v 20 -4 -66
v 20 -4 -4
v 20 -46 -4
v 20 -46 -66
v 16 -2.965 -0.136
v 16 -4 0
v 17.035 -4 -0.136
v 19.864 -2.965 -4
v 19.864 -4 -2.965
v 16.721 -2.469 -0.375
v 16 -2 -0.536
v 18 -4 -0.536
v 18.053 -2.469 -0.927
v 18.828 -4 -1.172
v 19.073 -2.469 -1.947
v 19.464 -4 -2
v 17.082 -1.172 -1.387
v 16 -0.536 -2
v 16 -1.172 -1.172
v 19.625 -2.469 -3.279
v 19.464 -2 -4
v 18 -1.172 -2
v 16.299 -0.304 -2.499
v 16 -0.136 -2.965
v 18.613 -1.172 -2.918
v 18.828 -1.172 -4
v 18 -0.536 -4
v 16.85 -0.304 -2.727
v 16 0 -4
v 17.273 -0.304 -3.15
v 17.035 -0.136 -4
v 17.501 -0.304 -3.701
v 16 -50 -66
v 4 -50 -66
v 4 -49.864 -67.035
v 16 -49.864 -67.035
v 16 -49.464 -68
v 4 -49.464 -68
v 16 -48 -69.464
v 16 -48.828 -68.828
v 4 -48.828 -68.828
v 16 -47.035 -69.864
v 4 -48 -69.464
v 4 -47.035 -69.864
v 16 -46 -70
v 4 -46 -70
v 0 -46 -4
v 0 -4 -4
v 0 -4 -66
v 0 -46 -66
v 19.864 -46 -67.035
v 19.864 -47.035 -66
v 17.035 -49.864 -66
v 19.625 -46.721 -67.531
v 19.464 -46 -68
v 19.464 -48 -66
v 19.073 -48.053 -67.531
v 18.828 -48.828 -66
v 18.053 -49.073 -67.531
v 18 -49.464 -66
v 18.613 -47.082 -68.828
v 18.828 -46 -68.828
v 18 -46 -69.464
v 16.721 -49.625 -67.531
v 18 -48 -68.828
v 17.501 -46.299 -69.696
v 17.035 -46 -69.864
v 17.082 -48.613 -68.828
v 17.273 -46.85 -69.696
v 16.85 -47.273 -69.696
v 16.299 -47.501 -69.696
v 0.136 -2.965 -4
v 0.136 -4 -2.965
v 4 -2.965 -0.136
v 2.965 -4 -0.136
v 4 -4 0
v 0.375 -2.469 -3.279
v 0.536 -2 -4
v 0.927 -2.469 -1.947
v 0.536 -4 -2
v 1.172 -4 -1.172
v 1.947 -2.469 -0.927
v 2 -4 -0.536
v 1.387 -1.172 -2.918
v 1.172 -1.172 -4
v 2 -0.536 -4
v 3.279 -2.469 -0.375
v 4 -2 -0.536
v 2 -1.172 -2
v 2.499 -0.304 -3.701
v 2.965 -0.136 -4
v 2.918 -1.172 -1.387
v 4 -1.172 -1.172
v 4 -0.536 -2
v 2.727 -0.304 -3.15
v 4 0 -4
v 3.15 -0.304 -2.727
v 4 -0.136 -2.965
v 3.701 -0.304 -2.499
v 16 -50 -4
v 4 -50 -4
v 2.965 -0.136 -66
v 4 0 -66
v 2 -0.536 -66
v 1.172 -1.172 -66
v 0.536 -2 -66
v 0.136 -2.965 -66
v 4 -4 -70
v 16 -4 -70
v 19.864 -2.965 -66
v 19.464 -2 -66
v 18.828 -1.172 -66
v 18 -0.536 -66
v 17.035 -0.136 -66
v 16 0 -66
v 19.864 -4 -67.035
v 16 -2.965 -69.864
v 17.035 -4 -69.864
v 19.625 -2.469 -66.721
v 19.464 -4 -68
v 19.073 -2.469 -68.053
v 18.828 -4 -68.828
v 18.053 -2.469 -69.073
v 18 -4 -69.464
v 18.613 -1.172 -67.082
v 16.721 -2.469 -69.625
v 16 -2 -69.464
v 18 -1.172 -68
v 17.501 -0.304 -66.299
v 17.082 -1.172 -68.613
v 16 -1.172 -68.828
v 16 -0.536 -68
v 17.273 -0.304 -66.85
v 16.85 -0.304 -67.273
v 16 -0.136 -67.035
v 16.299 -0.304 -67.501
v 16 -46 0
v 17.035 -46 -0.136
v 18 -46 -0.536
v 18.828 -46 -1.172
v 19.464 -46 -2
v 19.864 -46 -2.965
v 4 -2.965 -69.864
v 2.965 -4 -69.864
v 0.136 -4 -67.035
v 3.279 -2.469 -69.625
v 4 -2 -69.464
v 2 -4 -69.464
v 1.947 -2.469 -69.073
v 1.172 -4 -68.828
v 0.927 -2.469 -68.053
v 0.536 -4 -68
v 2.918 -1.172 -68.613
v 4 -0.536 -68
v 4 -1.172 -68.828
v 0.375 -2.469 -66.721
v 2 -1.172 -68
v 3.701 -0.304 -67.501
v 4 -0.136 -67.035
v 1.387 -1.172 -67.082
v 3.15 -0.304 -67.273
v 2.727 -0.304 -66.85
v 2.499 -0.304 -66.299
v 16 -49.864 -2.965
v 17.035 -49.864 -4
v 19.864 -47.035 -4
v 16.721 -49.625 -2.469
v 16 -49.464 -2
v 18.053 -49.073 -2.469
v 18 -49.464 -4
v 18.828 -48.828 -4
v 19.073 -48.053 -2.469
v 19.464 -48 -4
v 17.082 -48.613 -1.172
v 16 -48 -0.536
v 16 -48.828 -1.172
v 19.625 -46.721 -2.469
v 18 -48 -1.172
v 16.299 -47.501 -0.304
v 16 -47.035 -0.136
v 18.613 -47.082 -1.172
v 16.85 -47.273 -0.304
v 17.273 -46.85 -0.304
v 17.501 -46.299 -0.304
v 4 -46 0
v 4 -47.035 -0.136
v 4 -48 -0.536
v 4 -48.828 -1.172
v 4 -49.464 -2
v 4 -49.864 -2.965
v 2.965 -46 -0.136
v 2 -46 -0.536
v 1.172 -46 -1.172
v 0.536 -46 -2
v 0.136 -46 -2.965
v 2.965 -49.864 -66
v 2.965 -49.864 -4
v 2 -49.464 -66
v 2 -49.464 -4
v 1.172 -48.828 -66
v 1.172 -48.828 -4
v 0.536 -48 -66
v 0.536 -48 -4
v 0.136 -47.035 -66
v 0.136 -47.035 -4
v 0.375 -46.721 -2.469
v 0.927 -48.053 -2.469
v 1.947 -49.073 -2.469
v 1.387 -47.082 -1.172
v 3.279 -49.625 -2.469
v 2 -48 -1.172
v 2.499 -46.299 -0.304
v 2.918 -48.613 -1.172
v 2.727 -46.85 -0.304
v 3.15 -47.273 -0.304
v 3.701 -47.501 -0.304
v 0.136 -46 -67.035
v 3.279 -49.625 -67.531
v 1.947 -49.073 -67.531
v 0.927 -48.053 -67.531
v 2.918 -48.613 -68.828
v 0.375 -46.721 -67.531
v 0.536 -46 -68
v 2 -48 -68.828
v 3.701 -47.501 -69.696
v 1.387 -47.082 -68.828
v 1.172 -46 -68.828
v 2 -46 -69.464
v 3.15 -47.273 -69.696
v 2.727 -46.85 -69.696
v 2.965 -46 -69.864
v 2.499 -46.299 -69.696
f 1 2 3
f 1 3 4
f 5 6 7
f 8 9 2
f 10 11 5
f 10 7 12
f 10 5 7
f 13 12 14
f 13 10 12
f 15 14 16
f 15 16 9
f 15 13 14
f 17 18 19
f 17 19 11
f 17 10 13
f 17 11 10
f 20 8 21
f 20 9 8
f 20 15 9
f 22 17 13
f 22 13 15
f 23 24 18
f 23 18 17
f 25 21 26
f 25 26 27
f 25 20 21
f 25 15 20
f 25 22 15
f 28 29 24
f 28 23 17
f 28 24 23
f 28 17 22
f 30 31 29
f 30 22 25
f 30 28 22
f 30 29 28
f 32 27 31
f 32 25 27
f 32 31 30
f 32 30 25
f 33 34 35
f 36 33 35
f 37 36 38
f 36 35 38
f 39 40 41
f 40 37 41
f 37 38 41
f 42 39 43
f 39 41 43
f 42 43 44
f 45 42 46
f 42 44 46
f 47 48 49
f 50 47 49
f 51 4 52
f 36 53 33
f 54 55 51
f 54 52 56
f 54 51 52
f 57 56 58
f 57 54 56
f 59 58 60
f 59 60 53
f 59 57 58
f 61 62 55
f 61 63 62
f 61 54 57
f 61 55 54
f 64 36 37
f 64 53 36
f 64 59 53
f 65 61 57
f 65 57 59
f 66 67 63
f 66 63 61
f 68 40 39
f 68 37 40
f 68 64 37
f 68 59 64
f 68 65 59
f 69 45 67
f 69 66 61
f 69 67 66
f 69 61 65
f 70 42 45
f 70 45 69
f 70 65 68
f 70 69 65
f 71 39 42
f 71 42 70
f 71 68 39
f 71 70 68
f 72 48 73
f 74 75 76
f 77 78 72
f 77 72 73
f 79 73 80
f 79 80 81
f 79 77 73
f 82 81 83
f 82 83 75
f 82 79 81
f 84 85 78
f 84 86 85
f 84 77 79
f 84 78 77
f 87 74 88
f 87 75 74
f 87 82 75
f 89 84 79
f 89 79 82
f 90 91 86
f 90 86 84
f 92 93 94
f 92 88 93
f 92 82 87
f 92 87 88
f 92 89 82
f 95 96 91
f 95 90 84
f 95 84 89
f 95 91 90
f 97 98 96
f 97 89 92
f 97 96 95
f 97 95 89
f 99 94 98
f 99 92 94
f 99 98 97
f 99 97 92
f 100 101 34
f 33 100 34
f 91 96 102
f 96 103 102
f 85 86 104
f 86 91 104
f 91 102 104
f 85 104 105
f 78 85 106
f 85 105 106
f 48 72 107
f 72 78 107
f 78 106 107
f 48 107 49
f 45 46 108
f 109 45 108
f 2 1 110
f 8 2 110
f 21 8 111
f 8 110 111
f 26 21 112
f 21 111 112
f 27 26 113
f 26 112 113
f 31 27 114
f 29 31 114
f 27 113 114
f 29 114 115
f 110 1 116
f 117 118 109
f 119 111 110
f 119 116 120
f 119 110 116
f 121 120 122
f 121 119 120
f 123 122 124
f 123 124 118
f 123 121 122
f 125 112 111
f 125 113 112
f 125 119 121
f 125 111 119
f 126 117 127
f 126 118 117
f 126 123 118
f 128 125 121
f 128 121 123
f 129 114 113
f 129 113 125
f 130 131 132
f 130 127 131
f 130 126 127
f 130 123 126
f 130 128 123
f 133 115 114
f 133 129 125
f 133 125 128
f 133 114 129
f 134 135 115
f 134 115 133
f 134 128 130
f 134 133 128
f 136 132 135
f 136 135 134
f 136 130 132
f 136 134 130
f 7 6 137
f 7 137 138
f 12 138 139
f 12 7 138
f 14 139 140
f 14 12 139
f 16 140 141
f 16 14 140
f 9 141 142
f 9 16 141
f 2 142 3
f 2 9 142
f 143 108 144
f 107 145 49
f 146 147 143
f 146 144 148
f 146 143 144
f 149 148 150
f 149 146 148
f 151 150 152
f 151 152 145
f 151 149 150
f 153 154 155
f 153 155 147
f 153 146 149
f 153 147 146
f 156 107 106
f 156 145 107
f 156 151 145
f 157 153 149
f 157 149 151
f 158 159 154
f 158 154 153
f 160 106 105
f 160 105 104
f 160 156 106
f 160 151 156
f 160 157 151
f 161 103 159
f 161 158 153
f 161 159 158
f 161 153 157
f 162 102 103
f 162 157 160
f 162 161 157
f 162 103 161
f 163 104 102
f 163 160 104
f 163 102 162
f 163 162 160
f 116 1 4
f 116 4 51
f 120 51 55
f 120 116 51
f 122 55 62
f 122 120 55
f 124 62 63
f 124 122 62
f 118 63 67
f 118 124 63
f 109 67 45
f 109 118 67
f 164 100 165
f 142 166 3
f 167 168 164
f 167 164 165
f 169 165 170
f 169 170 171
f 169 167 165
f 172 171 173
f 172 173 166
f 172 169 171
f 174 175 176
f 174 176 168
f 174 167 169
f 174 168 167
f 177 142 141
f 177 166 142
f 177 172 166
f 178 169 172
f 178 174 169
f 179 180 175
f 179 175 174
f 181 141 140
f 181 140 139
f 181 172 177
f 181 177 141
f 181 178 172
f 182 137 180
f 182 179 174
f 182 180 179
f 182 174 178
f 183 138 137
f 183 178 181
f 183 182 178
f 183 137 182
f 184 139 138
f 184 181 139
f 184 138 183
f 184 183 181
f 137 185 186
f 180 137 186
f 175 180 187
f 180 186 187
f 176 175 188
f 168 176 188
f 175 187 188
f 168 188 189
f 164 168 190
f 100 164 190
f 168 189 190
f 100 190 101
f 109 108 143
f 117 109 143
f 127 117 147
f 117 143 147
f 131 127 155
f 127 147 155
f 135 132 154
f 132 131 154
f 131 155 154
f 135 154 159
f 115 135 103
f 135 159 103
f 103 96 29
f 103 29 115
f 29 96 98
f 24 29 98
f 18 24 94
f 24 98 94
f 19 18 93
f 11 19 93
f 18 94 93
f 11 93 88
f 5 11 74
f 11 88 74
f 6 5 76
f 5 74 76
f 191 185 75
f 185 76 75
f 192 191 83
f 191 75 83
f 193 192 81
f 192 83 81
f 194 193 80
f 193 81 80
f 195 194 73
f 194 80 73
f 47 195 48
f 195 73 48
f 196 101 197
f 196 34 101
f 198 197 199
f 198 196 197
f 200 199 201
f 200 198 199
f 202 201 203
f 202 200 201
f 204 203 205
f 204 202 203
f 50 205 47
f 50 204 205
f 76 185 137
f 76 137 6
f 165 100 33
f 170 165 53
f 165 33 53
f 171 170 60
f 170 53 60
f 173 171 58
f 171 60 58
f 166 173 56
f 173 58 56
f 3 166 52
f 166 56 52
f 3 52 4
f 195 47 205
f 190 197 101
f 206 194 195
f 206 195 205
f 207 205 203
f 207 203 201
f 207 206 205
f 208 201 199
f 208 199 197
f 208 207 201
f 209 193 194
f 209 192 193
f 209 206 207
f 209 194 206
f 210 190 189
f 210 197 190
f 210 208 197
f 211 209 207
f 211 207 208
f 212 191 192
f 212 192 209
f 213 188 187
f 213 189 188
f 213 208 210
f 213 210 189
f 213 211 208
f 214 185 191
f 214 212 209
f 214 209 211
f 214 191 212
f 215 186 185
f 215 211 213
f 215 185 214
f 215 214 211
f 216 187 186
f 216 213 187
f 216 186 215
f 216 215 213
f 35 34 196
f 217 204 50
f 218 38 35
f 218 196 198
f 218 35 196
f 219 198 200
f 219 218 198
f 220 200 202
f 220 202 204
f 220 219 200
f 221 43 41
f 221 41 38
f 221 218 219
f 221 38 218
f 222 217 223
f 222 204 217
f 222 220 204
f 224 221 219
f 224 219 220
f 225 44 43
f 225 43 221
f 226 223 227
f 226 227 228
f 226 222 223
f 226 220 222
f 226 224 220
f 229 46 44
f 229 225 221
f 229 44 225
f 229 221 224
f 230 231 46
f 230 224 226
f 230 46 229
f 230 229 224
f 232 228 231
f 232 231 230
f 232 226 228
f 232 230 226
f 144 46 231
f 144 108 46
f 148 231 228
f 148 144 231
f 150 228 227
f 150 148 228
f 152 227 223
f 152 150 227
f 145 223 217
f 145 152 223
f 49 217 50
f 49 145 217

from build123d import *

# Parameters (mm, degrees)
SKETCH_1_W      = 70
SKETCH_1_H      = 50
EXTRUDE_1_DEPTH = 20
FILLET_1_R      = 4
FILLET_2_R      = 4
FILLET_3_R      = 4


with BuildPart() as part:
    # 草图1 → 凸台-拉伸1 (new body)
    with BuildSketch(Plane(origin=(0, 0, 0), x_dir=(0, 0, -1), z_dir=(1, 0, 0))):
        with Locations((35, -25)):
            Rectangle(SKETCH_1_W, SKETCH_1_H)
    extrude(amount=EXTRUDE_1_DEPTH)

    # 圆角1
    fillet_1_edges = [part.edges().sort_by_distance(p)[0] for p in [
        (0, 0, -35),
        (0, -25, -70),
        (0, -50, -35),
        (0, -25, 0),
    ]]
    fillet(fillet_1_edges, radius=FILLET_1_R)

    # 圆角2
    fillet_2_edges = [part.edges().sort_by_distance(p)[0] for p in [
        (20, -25, -70),
        (20, 0, -35),
        (20, -25, 0),
        (20, -50, -35),
    ]]
    fillet(fillet_2_edges, radius=FILLET_2_R)

    # 圆角3
    # the kernel refuses this fillet: 4 mm, written as the material it takes off along each edge
    with BuildSketch(Plane(origin=(4, -46, -4), x_dir=(0, -1, 0), z_dir=(0, 0, 1))) as fillet_3_piece_1_section:
        Polygon((0, 0), (FILLET_3_R, 0), (FILLET_3_R, -FILLET_3_R), (0, -FILLET_3_R), align=None)
    fillet_3_piece_1 = extrude(amount=FILLET_3_R, mode=Mode.PRIVATE)
    fillet_3_piece_1 = fillet_3_piece_1 - Plane(origin=(4, -46, -4), x_dir=(0.7071067811865475, 0.7071067811865475, 0), z_dir=(0, 0, 1)) * Sphere(FILLET_3_R, mode=Mode.PRIVATE)
    add(fillet_3_piece_1, mode=Mode.SUBTRACT)
    with BuildSketch(Plane(origin=(4, -4, -4), x_dir=(0, 0, 1), z_dir=(0, 1, 0))) as fillet_3_piece_2_section:
        Polygon((0, 0), (FILLET_3_R, 0), (FILLET_3_R, -FILLET_3_R), (0, -FILLET_3_R), align=None)
    fillet_3_piece_2 = extrude(amount=FILLET_3_R, mode=Mode.PRIVATE)
    fillet_3_piece_2 = fillet_3_piece_2 - Plane(origin=(4, -4, -4), x_dir=(0.7071067811865475, 0, -0.7071067811865475), z_dir=(0, 1, 0)) * Sphere(FILLET_3_R, mode=Mode.PRIVATE)
    add(fillet_3_piece_2, mode=Mode.SUBTRACT)
    with BuildSketch(Plane(origin=(4, -46, -66), x_dir=(0, -1, 0), z_dir=(0, 0, -1))) as fillet_3_piece_3_section:
        Polygon((0, 0), (FILLET_3_R, 0), (FILLET_3_R, FILLET_3_R), (0, FILLET_3_R), align=None)
    fillet_3_piece_3 = extrude(amount=FILLET_3_R, mode=Mode.PRIVATE)
    fillet_3_piece_3 = fillet_3_piece_3 - Plane(origin=(4, -46, -66), x_dir=(0.7071067811865475, 0.7071067811865475, 0), z_dir=(0, 0, -1)) * Sphere(FILLET_3_R, mode=Mode.PRIVATE)
    add(fillet_3_piece_3, mode=Mode.SUBTRACT)
    with BuildSketch(Plane(origin=(4, -4, -66), x_dir=(0, 0, -1), z_dir=(0, 1, 0))) as fillet_3_piece_4_section:
        Polygon((0, 0), (FILLET_3_R, 0), (FILLET_3_R, FILLET_3_R), (0, FILLET_3_R), align=None)
    fillet_3_piece_4 = extrude(amount=FILLET_3_R, mode=Mode.PRIVATE)
    fillet_3_piece_4 = fillet_3_piece_4 - Plane(origin=(4, -4, -66), x_dir=(0.7071067811865475, 0, 0.7071067811865475), z_dir=(0, 1, 0)) * Sphere(FILLET_3_R, mode=Mode.PRIVATE)
    add(fillet_3_piece_4, mode=Mode.SUBTRACT)
    with BuildSketch(Plane(origin=(16, -4, -66), x_dir=(0, 0, -1), z_dir=(0, 1, 0))) as fillet_3_piece_5_section:
        Polygon((0, 0), (FILLET_3_R, 0), (FILLET_3_R, -FILLET_3_R), (0, -FILLET_3_R), align=None)
    fillet_3_piece_5 = extrude(amount=FILLET_3_R, mode=Mode.PRIVATE)
    fillet_3_piece_5 = fillet_3_piece_5 - Plane(origin=(16, -4, -66), x_dir=(-0.7071067811865475, 0, 0.7071067811865475), z_dir=(0, 1, 0)) * Sphere(FILLET_3_R, mode=Mode.PRIVATE)
    add(fillet_3_piece_5, mode=Mode.SUBTRACT)
    with BuildSketch(Plane(origin=(16, -46, -66), x_dir=(0, -1, 0), z_dir=(0, 0, -1))) as fillet_3_piece_6_section:
        Polygon((0, 0), (FILLET_3_R, 0), (FILLET_3_R, -FILLET_3_R), (0, -FILLET_3_R), align=None)
    fillet_3_piece_6 = extrude(amount=FILLET_3_R, mode=Mode.PRIVATE)
    fillet_3_piece_6 = fillet_3_piece_6 - Plane(origin=(16, -46, -66), x_dir=(-0.7071067811865475, 0.7071067811865475, 0), z_dir=(0, 0, -1)) * Sphere(FILLET_3_R, mode=Mode.PRIVATE)
    add(fillet_3_piece_6, mode=Mode.SUBTRACT)
    with BuildSketch(Plane(origin=(16, -4, -4), x_dir=(0, 0, 1), z_dir=(0, 1, 0))) as fillet_3_piece_7_section:
        Polygon((0, 0), (FILLET_3_R, 0), (FILLET_3_R, FILLET_3_R), (0, FILLET_3_R), align=None)
    fillet_3_piece_7 = extrude(amount=FILLET_3_R, mode=Mode.PRIVATE)
    fillet_3_piece_7 = fillet_3_piece_7 - Plane(origin=(16, -4, -4), x_dir=(-0.7071067811865475, 0, -0.7071067811865475), z_dir=(0, 1, 0)) * Sphere(FILLET_3_R, mode=Mode.PRIVATE)
    add(fillet_3_piece_7, mode=Mode.SUBTRACT)
    with BuildSketch(Plane(origin=(16, -46, -4), x_dir=(0, -1, 0), z_dir=(0, 0, 1))) as fillet_3_piece_8_section:
        Polygon((0, 0), (FILLET_3_R, 0), (FILLET_3_R, FILLET_3_R), (0, FILLET_3_R), align=None)
    fillet_3_piece_8 = extrude(amount=FILLET_3_R, mode=Mode.PRIVATE)
    fillet_3_piece_8 = fillet_3_piece_8 - Plane(origin=(16, -46, -4), x_dir=(-0.7071067811865475, 0.7071067811865475, 0), z_dir=(0, 0, 1)) * Sphere(FILLET_3_R, mode=Mode.PRIVATE)
    add(fillet_3_piece_8, mode=Mode.SUBTRACT)
    with BuildSketch(Plane(origin=(4, 0, 0), x_dir=(0, 0, -1), z_dir=(1, 0, 0)), Plane(origin=(4, -50, 0), x_dir=(0, 1, 0), z_dir=(1, 0, 0))) as fillet_3_piece_9:
        with BuildLine():
            CenterArc((FILLET_3_R, -FILLET_3_R), FILLET_3_R, 90, 90)
            Line((0, -FILLET_3_R), (0, 0))
            Line((0, 0), (FILLET_3_R, 0))
        make_face()
    extrude(amount=12, mode=Mode.SUBTRACT)
    with BuildSketch(Plane(origin=(4, -50, -70), x_dir=(0, 1, 0), z_dir=(1, 0, 0)), Plane(origin=(4, 0, -70), x_dir=(0, 0, 1), z_dir=(1, 0, 0))) as fillet_3_piece_10:
        with BuildLine():
            CenterArc((FILLET_3_R, FILLET_3_R), FILLET_3_R, 180, 90)
            Line((0, FILLET_3_R), (0, 0))
            Line((0, 0), (FILLET_3_R, 0))
        make_face()
    extrude(amount=12, mode=Mode.SUBTRACT)


solid = part.part
